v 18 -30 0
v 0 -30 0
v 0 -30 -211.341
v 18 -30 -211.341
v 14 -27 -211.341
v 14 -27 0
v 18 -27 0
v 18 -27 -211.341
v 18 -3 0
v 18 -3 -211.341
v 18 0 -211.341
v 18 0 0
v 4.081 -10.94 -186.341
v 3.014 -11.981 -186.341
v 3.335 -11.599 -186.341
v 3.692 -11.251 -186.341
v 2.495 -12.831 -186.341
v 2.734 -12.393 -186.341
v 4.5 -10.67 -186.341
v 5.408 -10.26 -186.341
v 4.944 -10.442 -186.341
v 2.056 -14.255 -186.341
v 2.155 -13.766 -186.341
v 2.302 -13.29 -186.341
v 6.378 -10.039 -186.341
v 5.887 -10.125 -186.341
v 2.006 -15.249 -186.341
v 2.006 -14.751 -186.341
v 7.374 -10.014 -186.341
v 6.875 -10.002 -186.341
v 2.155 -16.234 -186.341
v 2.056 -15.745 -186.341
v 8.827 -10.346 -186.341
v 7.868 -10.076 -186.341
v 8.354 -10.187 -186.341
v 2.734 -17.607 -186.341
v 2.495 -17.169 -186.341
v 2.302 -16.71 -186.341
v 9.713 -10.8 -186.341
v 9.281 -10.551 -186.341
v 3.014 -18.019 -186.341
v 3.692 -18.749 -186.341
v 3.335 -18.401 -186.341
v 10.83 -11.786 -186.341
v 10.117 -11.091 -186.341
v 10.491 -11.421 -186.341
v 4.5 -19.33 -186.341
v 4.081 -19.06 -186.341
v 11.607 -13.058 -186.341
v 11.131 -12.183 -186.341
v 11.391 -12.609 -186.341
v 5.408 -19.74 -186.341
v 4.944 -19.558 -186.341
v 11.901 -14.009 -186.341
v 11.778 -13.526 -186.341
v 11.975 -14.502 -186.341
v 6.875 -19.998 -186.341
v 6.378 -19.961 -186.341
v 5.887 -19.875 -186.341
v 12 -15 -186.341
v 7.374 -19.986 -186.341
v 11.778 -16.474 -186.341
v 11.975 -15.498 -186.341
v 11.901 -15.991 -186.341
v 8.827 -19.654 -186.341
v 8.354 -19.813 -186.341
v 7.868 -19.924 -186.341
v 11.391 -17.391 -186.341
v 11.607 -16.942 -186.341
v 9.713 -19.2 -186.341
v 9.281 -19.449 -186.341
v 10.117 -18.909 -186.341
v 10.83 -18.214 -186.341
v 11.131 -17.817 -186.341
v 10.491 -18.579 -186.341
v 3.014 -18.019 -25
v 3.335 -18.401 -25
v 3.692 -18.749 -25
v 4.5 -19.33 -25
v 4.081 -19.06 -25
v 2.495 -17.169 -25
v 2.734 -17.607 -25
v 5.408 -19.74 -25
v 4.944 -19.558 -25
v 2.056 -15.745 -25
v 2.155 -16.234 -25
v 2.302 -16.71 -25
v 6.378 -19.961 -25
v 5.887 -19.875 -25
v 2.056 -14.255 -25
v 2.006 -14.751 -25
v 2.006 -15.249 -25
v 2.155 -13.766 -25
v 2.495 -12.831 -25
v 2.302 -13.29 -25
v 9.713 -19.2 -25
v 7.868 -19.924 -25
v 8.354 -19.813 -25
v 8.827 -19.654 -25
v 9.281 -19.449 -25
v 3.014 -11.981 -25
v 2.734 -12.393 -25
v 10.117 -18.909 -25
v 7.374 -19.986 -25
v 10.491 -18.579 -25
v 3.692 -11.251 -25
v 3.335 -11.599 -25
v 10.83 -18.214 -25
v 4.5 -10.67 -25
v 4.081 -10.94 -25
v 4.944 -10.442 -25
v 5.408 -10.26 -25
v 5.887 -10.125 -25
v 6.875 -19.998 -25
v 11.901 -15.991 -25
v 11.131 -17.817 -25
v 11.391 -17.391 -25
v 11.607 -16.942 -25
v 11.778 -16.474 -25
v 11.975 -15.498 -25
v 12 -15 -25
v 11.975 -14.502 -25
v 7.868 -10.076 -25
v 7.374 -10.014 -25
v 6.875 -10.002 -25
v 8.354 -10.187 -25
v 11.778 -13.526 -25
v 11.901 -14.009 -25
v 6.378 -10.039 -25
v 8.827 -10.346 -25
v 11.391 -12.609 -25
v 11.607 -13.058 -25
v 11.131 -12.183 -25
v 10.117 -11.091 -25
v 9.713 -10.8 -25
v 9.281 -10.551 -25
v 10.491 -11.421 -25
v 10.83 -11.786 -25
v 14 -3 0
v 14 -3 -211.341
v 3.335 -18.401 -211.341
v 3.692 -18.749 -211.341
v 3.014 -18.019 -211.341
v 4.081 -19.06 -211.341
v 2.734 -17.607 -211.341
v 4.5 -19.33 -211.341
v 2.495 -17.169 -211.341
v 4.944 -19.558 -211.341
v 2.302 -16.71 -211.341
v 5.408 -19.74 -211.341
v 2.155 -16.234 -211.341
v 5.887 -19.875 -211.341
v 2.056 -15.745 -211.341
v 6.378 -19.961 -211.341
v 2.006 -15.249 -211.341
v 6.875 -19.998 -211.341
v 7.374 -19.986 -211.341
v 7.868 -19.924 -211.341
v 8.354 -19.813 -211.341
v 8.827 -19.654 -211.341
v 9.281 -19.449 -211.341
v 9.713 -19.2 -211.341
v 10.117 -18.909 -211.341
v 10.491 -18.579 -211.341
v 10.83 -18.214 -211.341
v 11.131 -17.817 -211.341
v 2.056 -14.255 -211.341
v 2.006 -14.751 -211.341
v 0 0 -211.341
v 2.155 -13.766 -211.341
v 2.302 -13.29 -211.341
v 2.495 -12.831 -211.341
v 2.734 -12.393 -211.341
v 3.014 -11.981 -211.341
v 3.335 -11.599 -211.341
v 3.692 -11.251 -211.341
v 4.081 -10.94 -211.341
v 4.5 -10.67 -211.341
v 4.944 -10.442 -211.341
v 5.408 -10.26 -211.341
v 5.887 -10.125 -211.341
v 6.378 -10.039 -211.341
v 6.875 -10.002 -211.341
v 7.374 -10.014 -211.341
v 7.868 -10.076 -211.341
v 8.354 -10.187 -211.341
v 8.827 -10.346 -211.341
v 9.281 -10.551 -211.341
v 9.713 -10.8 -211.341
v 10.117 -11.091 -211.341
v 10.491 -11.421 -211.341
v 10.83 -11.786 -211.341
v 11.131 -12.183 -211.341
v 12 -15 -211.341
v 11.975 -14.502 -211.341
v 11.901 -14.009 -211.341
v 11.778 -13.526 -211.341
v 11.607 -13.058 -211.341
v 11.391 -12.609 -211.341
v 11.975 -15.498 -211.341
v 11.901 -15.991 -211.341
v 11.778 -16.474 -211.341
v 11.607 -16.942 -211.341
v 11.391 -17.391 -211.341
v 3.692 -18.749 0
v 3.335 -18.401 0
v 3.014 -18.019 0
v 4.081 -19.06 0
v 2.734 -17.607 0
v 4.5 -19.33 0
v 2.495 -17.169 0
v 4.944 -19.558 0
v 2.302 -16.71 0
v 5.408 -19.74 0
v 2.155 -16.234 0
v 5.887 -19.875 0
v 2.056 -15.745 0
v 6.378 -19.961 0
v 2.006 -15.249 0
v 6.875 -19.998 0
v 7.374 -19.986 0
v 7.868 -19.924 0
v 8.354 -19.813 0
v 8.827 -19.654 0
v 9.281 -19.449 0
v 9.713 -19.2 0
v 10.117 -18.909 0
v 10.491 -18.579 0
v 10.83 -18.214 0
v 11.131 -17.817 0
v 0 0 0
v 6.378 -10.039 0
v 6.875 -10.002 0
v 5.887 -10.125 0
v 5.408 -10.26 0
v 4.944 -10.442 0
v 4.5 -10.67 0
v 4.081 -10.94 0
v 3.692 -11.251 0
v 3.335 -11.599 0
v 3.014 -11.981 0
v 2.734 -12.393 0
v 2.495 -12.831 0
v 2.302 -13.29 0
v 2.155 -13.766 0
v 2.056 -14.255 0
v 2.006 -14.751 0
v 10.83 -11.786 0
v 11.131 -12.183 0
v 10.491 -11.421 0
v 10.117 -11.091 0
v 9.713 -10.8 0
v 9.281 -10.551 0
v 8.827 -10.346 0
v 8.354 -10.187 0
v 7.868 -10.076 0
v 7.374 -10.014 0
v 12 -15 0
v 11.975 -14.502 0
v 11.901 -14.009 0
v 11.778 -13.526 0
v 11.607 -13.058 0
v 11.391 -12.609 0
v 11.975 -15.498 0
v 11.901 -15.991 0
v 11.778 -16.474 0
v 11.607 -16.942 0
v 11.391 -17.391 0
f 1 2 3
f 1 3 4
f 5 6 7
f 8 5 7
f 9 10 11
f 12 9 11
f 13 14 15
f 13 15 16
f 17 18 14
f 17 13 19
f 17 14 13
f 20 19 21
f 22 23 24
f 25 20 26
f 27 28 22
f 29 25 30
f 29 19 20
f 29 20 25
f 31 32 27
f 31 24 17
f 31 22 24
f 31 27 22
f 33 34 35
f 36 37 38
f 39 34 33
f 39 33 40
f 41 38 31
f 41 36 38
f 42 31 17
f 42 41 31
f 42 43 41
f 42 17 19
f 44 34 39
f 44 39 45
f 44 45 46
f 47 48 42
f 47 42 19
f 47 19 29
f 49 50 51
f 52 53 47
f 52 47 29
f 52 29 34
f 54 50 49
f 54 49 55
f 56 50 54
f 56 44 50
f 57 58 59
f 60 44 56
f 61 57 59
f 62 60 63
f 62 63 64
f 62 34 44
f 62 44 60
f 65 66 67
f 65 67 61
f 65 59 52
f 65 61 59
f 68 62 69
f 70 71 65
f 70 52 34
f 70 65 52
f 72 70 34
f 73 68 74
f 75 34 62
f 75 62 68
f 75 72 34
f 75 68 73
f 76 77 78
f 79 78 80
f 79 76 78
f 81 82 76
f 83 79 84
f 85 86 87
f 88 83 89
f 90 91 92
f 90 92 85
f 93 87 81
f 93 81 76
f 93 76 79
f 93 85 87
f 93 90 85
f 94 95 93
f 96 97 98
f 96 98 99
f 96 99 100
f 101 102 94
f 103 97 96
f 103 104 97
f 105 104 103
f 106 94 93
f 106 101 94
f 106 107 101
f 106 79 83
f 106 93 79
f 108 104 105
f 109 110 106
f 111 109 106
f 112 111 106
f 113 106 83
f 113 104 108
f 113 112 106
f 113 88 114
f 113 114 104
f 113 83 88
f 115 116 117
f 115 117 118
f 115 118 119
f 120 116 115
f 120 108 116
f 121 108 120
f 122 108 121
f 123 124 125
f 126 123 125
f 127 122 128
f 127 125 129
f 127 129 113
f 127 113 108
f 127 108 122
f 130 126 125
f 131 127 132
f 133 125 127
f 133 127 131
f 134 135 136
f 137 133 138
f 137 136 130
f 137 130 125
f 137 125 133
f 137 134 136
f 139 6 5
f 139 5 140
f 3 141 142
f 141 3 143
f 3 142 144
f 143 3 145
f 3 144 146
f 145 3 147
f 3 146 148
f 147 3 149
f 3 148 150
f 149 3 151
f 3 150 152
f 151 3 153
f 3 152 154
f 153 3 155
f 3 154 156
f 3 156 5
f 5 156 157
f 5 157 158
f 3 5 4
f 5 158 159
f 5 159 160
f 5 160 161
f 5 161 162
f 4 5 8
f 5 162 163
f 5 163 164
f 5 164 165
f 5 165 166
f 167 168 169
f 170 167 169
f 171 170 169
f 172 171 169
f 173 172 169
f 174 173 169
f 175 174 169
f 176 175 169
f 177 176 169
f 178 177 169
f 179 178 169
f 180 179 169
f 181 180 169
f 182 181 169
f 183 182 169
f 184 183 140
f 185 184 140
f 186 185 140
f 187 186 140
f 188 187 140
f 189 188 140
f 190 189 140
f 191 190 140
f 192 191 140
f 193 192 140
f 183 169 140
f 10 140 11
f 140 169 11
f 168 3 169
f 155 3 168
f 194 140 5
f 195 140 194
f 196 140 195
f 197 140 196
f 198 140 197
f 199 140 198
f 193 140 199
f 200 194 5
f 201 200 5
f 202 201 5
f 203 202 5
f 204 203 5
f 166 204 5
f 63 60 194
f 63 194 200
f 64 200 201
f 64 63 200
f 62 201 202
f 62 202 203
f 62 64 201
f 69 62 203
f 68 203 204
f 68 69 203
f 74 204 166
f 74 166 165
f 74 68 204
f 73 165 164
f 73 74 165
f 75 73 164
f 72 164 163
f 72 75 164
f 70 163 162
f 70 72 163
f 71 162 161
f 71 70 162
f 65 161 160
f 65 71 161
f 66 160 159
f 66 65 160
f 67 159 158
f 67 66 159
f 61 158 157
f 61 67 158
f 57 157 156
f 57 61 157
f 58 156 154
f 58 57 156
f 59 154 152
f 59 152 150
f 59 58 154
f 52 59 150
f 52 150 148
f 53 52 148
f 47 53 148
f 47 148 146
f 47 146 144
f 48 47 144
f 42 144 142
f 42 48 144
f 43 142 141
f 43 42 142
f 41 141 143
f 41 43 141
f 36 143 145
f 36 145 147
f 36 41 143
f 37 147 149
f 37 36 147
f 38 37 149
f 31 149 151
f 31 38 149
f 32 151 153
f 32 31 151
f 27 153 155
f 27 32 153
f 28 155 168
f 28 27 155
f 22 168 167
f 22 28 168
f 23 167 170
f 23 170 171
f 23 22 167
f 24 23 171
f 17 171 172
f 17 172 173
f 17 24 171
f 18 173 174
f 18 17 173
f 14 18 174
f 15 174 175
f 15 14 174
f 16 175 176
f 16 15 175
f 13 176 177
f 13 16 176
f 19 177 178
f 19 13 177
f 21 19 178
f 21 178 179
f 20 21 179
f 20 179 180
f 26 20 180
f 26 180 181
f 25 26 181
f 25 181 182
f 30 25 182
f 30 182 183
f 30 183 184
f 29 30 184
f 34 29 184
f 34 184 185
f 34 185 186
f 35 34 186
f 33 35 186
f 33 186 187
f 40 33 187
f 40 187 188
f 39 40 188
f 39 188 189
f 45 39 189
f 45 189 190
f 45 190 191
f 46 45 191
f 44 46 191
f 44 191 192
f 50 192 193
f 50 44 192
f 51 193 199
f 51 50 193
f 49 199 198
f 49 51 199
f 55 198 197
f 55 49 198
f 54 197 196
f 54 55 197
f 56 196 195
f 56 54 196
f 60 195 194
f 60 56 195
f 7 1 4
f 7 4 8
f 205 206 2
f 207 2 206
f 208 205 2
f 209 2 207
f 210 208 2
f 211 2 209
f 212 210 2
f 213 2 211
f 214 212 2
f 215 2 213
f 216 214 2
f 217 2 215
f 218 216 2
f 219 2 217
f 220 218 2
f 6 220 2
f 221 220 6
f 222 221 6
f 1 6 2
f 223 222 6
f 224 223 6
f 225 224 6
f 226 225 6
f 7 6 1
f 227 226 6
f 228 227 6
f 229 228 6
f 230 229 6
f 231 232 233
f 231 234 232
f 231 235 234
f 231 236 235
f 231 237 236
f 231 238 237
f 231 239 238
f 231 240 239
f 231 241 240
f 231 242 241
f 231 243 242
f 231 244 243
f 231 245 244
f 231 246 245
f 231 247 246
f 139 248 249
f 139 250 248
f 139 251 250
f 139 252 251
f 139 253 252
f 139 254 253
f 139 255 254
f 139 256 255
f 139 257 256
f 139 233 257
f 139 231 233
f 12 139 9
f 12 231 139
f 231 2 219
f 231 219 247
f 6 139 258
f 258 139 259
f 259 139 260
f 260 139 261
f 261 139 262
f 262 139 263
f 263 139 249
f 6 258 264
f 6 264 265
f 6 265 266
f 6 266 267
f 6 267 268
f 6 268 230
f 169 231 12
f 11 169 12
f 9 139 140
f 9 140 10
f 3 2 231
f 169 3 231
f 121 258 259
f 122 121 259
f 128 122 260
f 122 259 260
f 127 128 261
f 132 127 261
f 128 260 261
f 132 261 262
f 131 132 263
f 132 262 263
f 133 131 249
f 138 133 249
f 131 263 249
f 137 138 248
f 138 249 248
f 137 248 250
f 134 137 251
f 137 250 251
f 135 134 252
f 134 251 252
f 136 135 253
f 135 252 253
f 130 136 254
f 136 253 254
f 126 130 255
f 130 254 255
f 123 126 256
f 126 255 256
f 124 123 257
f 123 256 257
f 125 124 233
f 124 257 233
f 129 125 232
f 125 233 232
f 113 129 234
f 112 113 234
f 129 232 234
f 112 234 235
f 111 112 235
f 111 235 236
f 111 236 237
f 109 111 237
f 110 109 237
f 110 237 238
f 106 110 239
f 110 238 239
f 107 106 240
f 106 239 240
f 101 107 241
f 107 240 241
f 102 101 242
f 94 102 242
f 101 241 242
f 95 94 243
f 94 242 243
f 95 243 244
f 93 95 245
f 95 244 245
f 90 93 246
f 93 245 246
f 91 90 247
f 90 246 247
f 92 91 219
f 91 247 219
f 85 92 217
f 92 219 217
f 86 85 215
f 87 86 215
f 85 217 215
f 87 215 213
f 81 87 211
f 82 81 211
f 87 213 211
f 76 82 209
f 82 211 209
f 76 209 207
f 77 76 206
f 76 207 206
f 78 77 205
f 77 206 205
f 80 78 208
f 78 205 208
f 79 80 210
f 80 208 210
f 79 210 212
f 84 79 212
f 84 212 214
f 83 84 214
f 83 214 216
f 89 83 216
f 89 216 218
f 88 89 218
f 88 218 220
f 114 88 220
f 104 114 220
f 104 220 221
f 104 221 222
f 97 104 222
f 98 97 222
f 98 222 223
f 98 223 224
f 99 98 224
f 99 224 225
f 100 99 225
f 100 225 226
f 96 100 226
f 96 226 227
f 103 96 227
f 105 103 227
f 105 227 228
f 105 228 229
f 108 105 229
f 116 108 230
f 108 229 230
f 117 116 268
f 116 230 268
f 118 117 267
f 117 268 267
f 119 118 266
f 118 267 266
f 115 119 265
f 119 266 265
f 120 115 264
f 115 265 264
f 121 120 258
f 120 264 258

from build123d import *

# Parameters (mm, degrees)
SKETCH2_W           = 18
SKETCH2_H           = 30
BOSS_EXTRUDE1_DEPTH = 211.341
SKETCH3_W           = 4
SKETCH3_H           = 24
CUT_EXTRUDE1_DEPTH  = 1000
SKETCH4_R           = 5
CUT_EXTRUDE2_DEPTH  = 25
CUT_EXTRUDE3_START  = -25
SKETCH5_R           = 5
CUT_EXTRUDE3_DEPTH  = 25


with BuildPart() as part:
    # Sketch2 → Boss-Extrude1 (new body)
    with BuildSketch(Plane.XY):
        with Locations((9, -15)):
            Rectangle(SKETCH2_W, SKETCH2_H)
    extrude(amount=-BOSS_EXTRUDE1_DEPTH)

    # Sketch3 → Cut-Extrude1 (cut)
    with BuildSketch(Plane.XY):
        with Locations((16, -15)):
            Rectangle(SKETCH3_W, SKETCH3_H)
    extrude(amount=-CUT_EXTRUDE1_DEPTH, mode=Mode.SUBTRACT)

    # Sketch4 → Cut-Extrude2 (cut)
    with BuildSketch(Plane.XY):
        with Locations((7, -15)):
            Circle(SKETCH4_R)
    extrude(amount=-CUT_EXTRUDE2_DEPTH, mode=Mode.SUBTRACT)

    # Sketch5 → Cut-Extrude3 (cut)
    with BuildSketch(Plane(origin=(0, 0, -211.341), x_dir=(-1, 0, 0), z_dir=(0, 0, -1)).offset(CUT_EXTRUDE3_START)):
        with Locations(Location((-7, -15, 0), (0, 0, 180))):
            Circle(SKETCH5_R)
    extrude(amount=CUT_EXTRUDE3_DEPTH, mode=Mode.SUBTRACT)


solid = part.part
